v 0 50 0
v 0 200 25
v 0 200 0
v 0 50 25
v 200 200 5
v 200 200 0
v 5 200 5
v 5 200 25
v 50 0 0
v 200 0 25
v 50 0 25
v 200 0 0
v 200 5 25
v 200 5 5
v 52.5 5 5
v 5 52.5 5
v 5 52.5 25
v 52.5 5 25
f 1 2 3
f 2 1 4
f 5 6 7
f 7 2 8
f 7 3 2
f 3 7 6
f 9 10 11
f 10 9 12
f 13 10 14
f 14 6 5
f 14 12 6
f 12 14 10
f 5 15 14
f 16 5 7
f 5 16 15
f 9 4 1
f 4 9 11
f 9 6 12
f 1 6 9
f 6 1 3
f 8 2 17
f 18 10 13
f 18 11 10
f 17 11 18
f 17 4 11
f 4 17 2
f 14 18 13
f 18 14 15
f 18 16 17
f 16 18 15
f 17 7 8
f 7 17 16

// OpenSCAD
/* [Open Luggage Params:] */
// Overall footprint size
moduleSize = 200; // [50:350]
// Height of the walls
wallHeight = 20; // [5:300]
// Thickness of the base
baseThinkness = 5; // [1:10]
// Thickness of the walls
wallThinkness = 5; // [1:10]
// Size of corner cutout
cornerSize = 50; // [10:100]

module corner() {
    union() {
        linear_extrude(height=baseThinkness)
            polygon(
                points=[
                    [0,cornerSize],
                    [cornerSize,0],
                    [moduleSize ,0],
                    [moduleSize,moduleSize],
                    [cornerSize,moduleSize],
                    [0,moduleSize]
                ]
            );
            translate([0, 0, baseThinkness])
        linear_extrude(height=wallHeight)
            polygon(
                points=[
                    [0,cornerSize],
                    [cornerSize,0],
                    [moduleSize ,0],
                    [moduleSize,wallThinkness], 
                    [cornerSize + (wallThinkness/2), wallThinkness],
                    [wallThinkness, cornerSize + (wallThinkness/2)],
                    [wallThinkness,moduleSize],
                    [0,moduleSize],
                    [0,cornerSize]
                ]
            );
    }
}

corner();
